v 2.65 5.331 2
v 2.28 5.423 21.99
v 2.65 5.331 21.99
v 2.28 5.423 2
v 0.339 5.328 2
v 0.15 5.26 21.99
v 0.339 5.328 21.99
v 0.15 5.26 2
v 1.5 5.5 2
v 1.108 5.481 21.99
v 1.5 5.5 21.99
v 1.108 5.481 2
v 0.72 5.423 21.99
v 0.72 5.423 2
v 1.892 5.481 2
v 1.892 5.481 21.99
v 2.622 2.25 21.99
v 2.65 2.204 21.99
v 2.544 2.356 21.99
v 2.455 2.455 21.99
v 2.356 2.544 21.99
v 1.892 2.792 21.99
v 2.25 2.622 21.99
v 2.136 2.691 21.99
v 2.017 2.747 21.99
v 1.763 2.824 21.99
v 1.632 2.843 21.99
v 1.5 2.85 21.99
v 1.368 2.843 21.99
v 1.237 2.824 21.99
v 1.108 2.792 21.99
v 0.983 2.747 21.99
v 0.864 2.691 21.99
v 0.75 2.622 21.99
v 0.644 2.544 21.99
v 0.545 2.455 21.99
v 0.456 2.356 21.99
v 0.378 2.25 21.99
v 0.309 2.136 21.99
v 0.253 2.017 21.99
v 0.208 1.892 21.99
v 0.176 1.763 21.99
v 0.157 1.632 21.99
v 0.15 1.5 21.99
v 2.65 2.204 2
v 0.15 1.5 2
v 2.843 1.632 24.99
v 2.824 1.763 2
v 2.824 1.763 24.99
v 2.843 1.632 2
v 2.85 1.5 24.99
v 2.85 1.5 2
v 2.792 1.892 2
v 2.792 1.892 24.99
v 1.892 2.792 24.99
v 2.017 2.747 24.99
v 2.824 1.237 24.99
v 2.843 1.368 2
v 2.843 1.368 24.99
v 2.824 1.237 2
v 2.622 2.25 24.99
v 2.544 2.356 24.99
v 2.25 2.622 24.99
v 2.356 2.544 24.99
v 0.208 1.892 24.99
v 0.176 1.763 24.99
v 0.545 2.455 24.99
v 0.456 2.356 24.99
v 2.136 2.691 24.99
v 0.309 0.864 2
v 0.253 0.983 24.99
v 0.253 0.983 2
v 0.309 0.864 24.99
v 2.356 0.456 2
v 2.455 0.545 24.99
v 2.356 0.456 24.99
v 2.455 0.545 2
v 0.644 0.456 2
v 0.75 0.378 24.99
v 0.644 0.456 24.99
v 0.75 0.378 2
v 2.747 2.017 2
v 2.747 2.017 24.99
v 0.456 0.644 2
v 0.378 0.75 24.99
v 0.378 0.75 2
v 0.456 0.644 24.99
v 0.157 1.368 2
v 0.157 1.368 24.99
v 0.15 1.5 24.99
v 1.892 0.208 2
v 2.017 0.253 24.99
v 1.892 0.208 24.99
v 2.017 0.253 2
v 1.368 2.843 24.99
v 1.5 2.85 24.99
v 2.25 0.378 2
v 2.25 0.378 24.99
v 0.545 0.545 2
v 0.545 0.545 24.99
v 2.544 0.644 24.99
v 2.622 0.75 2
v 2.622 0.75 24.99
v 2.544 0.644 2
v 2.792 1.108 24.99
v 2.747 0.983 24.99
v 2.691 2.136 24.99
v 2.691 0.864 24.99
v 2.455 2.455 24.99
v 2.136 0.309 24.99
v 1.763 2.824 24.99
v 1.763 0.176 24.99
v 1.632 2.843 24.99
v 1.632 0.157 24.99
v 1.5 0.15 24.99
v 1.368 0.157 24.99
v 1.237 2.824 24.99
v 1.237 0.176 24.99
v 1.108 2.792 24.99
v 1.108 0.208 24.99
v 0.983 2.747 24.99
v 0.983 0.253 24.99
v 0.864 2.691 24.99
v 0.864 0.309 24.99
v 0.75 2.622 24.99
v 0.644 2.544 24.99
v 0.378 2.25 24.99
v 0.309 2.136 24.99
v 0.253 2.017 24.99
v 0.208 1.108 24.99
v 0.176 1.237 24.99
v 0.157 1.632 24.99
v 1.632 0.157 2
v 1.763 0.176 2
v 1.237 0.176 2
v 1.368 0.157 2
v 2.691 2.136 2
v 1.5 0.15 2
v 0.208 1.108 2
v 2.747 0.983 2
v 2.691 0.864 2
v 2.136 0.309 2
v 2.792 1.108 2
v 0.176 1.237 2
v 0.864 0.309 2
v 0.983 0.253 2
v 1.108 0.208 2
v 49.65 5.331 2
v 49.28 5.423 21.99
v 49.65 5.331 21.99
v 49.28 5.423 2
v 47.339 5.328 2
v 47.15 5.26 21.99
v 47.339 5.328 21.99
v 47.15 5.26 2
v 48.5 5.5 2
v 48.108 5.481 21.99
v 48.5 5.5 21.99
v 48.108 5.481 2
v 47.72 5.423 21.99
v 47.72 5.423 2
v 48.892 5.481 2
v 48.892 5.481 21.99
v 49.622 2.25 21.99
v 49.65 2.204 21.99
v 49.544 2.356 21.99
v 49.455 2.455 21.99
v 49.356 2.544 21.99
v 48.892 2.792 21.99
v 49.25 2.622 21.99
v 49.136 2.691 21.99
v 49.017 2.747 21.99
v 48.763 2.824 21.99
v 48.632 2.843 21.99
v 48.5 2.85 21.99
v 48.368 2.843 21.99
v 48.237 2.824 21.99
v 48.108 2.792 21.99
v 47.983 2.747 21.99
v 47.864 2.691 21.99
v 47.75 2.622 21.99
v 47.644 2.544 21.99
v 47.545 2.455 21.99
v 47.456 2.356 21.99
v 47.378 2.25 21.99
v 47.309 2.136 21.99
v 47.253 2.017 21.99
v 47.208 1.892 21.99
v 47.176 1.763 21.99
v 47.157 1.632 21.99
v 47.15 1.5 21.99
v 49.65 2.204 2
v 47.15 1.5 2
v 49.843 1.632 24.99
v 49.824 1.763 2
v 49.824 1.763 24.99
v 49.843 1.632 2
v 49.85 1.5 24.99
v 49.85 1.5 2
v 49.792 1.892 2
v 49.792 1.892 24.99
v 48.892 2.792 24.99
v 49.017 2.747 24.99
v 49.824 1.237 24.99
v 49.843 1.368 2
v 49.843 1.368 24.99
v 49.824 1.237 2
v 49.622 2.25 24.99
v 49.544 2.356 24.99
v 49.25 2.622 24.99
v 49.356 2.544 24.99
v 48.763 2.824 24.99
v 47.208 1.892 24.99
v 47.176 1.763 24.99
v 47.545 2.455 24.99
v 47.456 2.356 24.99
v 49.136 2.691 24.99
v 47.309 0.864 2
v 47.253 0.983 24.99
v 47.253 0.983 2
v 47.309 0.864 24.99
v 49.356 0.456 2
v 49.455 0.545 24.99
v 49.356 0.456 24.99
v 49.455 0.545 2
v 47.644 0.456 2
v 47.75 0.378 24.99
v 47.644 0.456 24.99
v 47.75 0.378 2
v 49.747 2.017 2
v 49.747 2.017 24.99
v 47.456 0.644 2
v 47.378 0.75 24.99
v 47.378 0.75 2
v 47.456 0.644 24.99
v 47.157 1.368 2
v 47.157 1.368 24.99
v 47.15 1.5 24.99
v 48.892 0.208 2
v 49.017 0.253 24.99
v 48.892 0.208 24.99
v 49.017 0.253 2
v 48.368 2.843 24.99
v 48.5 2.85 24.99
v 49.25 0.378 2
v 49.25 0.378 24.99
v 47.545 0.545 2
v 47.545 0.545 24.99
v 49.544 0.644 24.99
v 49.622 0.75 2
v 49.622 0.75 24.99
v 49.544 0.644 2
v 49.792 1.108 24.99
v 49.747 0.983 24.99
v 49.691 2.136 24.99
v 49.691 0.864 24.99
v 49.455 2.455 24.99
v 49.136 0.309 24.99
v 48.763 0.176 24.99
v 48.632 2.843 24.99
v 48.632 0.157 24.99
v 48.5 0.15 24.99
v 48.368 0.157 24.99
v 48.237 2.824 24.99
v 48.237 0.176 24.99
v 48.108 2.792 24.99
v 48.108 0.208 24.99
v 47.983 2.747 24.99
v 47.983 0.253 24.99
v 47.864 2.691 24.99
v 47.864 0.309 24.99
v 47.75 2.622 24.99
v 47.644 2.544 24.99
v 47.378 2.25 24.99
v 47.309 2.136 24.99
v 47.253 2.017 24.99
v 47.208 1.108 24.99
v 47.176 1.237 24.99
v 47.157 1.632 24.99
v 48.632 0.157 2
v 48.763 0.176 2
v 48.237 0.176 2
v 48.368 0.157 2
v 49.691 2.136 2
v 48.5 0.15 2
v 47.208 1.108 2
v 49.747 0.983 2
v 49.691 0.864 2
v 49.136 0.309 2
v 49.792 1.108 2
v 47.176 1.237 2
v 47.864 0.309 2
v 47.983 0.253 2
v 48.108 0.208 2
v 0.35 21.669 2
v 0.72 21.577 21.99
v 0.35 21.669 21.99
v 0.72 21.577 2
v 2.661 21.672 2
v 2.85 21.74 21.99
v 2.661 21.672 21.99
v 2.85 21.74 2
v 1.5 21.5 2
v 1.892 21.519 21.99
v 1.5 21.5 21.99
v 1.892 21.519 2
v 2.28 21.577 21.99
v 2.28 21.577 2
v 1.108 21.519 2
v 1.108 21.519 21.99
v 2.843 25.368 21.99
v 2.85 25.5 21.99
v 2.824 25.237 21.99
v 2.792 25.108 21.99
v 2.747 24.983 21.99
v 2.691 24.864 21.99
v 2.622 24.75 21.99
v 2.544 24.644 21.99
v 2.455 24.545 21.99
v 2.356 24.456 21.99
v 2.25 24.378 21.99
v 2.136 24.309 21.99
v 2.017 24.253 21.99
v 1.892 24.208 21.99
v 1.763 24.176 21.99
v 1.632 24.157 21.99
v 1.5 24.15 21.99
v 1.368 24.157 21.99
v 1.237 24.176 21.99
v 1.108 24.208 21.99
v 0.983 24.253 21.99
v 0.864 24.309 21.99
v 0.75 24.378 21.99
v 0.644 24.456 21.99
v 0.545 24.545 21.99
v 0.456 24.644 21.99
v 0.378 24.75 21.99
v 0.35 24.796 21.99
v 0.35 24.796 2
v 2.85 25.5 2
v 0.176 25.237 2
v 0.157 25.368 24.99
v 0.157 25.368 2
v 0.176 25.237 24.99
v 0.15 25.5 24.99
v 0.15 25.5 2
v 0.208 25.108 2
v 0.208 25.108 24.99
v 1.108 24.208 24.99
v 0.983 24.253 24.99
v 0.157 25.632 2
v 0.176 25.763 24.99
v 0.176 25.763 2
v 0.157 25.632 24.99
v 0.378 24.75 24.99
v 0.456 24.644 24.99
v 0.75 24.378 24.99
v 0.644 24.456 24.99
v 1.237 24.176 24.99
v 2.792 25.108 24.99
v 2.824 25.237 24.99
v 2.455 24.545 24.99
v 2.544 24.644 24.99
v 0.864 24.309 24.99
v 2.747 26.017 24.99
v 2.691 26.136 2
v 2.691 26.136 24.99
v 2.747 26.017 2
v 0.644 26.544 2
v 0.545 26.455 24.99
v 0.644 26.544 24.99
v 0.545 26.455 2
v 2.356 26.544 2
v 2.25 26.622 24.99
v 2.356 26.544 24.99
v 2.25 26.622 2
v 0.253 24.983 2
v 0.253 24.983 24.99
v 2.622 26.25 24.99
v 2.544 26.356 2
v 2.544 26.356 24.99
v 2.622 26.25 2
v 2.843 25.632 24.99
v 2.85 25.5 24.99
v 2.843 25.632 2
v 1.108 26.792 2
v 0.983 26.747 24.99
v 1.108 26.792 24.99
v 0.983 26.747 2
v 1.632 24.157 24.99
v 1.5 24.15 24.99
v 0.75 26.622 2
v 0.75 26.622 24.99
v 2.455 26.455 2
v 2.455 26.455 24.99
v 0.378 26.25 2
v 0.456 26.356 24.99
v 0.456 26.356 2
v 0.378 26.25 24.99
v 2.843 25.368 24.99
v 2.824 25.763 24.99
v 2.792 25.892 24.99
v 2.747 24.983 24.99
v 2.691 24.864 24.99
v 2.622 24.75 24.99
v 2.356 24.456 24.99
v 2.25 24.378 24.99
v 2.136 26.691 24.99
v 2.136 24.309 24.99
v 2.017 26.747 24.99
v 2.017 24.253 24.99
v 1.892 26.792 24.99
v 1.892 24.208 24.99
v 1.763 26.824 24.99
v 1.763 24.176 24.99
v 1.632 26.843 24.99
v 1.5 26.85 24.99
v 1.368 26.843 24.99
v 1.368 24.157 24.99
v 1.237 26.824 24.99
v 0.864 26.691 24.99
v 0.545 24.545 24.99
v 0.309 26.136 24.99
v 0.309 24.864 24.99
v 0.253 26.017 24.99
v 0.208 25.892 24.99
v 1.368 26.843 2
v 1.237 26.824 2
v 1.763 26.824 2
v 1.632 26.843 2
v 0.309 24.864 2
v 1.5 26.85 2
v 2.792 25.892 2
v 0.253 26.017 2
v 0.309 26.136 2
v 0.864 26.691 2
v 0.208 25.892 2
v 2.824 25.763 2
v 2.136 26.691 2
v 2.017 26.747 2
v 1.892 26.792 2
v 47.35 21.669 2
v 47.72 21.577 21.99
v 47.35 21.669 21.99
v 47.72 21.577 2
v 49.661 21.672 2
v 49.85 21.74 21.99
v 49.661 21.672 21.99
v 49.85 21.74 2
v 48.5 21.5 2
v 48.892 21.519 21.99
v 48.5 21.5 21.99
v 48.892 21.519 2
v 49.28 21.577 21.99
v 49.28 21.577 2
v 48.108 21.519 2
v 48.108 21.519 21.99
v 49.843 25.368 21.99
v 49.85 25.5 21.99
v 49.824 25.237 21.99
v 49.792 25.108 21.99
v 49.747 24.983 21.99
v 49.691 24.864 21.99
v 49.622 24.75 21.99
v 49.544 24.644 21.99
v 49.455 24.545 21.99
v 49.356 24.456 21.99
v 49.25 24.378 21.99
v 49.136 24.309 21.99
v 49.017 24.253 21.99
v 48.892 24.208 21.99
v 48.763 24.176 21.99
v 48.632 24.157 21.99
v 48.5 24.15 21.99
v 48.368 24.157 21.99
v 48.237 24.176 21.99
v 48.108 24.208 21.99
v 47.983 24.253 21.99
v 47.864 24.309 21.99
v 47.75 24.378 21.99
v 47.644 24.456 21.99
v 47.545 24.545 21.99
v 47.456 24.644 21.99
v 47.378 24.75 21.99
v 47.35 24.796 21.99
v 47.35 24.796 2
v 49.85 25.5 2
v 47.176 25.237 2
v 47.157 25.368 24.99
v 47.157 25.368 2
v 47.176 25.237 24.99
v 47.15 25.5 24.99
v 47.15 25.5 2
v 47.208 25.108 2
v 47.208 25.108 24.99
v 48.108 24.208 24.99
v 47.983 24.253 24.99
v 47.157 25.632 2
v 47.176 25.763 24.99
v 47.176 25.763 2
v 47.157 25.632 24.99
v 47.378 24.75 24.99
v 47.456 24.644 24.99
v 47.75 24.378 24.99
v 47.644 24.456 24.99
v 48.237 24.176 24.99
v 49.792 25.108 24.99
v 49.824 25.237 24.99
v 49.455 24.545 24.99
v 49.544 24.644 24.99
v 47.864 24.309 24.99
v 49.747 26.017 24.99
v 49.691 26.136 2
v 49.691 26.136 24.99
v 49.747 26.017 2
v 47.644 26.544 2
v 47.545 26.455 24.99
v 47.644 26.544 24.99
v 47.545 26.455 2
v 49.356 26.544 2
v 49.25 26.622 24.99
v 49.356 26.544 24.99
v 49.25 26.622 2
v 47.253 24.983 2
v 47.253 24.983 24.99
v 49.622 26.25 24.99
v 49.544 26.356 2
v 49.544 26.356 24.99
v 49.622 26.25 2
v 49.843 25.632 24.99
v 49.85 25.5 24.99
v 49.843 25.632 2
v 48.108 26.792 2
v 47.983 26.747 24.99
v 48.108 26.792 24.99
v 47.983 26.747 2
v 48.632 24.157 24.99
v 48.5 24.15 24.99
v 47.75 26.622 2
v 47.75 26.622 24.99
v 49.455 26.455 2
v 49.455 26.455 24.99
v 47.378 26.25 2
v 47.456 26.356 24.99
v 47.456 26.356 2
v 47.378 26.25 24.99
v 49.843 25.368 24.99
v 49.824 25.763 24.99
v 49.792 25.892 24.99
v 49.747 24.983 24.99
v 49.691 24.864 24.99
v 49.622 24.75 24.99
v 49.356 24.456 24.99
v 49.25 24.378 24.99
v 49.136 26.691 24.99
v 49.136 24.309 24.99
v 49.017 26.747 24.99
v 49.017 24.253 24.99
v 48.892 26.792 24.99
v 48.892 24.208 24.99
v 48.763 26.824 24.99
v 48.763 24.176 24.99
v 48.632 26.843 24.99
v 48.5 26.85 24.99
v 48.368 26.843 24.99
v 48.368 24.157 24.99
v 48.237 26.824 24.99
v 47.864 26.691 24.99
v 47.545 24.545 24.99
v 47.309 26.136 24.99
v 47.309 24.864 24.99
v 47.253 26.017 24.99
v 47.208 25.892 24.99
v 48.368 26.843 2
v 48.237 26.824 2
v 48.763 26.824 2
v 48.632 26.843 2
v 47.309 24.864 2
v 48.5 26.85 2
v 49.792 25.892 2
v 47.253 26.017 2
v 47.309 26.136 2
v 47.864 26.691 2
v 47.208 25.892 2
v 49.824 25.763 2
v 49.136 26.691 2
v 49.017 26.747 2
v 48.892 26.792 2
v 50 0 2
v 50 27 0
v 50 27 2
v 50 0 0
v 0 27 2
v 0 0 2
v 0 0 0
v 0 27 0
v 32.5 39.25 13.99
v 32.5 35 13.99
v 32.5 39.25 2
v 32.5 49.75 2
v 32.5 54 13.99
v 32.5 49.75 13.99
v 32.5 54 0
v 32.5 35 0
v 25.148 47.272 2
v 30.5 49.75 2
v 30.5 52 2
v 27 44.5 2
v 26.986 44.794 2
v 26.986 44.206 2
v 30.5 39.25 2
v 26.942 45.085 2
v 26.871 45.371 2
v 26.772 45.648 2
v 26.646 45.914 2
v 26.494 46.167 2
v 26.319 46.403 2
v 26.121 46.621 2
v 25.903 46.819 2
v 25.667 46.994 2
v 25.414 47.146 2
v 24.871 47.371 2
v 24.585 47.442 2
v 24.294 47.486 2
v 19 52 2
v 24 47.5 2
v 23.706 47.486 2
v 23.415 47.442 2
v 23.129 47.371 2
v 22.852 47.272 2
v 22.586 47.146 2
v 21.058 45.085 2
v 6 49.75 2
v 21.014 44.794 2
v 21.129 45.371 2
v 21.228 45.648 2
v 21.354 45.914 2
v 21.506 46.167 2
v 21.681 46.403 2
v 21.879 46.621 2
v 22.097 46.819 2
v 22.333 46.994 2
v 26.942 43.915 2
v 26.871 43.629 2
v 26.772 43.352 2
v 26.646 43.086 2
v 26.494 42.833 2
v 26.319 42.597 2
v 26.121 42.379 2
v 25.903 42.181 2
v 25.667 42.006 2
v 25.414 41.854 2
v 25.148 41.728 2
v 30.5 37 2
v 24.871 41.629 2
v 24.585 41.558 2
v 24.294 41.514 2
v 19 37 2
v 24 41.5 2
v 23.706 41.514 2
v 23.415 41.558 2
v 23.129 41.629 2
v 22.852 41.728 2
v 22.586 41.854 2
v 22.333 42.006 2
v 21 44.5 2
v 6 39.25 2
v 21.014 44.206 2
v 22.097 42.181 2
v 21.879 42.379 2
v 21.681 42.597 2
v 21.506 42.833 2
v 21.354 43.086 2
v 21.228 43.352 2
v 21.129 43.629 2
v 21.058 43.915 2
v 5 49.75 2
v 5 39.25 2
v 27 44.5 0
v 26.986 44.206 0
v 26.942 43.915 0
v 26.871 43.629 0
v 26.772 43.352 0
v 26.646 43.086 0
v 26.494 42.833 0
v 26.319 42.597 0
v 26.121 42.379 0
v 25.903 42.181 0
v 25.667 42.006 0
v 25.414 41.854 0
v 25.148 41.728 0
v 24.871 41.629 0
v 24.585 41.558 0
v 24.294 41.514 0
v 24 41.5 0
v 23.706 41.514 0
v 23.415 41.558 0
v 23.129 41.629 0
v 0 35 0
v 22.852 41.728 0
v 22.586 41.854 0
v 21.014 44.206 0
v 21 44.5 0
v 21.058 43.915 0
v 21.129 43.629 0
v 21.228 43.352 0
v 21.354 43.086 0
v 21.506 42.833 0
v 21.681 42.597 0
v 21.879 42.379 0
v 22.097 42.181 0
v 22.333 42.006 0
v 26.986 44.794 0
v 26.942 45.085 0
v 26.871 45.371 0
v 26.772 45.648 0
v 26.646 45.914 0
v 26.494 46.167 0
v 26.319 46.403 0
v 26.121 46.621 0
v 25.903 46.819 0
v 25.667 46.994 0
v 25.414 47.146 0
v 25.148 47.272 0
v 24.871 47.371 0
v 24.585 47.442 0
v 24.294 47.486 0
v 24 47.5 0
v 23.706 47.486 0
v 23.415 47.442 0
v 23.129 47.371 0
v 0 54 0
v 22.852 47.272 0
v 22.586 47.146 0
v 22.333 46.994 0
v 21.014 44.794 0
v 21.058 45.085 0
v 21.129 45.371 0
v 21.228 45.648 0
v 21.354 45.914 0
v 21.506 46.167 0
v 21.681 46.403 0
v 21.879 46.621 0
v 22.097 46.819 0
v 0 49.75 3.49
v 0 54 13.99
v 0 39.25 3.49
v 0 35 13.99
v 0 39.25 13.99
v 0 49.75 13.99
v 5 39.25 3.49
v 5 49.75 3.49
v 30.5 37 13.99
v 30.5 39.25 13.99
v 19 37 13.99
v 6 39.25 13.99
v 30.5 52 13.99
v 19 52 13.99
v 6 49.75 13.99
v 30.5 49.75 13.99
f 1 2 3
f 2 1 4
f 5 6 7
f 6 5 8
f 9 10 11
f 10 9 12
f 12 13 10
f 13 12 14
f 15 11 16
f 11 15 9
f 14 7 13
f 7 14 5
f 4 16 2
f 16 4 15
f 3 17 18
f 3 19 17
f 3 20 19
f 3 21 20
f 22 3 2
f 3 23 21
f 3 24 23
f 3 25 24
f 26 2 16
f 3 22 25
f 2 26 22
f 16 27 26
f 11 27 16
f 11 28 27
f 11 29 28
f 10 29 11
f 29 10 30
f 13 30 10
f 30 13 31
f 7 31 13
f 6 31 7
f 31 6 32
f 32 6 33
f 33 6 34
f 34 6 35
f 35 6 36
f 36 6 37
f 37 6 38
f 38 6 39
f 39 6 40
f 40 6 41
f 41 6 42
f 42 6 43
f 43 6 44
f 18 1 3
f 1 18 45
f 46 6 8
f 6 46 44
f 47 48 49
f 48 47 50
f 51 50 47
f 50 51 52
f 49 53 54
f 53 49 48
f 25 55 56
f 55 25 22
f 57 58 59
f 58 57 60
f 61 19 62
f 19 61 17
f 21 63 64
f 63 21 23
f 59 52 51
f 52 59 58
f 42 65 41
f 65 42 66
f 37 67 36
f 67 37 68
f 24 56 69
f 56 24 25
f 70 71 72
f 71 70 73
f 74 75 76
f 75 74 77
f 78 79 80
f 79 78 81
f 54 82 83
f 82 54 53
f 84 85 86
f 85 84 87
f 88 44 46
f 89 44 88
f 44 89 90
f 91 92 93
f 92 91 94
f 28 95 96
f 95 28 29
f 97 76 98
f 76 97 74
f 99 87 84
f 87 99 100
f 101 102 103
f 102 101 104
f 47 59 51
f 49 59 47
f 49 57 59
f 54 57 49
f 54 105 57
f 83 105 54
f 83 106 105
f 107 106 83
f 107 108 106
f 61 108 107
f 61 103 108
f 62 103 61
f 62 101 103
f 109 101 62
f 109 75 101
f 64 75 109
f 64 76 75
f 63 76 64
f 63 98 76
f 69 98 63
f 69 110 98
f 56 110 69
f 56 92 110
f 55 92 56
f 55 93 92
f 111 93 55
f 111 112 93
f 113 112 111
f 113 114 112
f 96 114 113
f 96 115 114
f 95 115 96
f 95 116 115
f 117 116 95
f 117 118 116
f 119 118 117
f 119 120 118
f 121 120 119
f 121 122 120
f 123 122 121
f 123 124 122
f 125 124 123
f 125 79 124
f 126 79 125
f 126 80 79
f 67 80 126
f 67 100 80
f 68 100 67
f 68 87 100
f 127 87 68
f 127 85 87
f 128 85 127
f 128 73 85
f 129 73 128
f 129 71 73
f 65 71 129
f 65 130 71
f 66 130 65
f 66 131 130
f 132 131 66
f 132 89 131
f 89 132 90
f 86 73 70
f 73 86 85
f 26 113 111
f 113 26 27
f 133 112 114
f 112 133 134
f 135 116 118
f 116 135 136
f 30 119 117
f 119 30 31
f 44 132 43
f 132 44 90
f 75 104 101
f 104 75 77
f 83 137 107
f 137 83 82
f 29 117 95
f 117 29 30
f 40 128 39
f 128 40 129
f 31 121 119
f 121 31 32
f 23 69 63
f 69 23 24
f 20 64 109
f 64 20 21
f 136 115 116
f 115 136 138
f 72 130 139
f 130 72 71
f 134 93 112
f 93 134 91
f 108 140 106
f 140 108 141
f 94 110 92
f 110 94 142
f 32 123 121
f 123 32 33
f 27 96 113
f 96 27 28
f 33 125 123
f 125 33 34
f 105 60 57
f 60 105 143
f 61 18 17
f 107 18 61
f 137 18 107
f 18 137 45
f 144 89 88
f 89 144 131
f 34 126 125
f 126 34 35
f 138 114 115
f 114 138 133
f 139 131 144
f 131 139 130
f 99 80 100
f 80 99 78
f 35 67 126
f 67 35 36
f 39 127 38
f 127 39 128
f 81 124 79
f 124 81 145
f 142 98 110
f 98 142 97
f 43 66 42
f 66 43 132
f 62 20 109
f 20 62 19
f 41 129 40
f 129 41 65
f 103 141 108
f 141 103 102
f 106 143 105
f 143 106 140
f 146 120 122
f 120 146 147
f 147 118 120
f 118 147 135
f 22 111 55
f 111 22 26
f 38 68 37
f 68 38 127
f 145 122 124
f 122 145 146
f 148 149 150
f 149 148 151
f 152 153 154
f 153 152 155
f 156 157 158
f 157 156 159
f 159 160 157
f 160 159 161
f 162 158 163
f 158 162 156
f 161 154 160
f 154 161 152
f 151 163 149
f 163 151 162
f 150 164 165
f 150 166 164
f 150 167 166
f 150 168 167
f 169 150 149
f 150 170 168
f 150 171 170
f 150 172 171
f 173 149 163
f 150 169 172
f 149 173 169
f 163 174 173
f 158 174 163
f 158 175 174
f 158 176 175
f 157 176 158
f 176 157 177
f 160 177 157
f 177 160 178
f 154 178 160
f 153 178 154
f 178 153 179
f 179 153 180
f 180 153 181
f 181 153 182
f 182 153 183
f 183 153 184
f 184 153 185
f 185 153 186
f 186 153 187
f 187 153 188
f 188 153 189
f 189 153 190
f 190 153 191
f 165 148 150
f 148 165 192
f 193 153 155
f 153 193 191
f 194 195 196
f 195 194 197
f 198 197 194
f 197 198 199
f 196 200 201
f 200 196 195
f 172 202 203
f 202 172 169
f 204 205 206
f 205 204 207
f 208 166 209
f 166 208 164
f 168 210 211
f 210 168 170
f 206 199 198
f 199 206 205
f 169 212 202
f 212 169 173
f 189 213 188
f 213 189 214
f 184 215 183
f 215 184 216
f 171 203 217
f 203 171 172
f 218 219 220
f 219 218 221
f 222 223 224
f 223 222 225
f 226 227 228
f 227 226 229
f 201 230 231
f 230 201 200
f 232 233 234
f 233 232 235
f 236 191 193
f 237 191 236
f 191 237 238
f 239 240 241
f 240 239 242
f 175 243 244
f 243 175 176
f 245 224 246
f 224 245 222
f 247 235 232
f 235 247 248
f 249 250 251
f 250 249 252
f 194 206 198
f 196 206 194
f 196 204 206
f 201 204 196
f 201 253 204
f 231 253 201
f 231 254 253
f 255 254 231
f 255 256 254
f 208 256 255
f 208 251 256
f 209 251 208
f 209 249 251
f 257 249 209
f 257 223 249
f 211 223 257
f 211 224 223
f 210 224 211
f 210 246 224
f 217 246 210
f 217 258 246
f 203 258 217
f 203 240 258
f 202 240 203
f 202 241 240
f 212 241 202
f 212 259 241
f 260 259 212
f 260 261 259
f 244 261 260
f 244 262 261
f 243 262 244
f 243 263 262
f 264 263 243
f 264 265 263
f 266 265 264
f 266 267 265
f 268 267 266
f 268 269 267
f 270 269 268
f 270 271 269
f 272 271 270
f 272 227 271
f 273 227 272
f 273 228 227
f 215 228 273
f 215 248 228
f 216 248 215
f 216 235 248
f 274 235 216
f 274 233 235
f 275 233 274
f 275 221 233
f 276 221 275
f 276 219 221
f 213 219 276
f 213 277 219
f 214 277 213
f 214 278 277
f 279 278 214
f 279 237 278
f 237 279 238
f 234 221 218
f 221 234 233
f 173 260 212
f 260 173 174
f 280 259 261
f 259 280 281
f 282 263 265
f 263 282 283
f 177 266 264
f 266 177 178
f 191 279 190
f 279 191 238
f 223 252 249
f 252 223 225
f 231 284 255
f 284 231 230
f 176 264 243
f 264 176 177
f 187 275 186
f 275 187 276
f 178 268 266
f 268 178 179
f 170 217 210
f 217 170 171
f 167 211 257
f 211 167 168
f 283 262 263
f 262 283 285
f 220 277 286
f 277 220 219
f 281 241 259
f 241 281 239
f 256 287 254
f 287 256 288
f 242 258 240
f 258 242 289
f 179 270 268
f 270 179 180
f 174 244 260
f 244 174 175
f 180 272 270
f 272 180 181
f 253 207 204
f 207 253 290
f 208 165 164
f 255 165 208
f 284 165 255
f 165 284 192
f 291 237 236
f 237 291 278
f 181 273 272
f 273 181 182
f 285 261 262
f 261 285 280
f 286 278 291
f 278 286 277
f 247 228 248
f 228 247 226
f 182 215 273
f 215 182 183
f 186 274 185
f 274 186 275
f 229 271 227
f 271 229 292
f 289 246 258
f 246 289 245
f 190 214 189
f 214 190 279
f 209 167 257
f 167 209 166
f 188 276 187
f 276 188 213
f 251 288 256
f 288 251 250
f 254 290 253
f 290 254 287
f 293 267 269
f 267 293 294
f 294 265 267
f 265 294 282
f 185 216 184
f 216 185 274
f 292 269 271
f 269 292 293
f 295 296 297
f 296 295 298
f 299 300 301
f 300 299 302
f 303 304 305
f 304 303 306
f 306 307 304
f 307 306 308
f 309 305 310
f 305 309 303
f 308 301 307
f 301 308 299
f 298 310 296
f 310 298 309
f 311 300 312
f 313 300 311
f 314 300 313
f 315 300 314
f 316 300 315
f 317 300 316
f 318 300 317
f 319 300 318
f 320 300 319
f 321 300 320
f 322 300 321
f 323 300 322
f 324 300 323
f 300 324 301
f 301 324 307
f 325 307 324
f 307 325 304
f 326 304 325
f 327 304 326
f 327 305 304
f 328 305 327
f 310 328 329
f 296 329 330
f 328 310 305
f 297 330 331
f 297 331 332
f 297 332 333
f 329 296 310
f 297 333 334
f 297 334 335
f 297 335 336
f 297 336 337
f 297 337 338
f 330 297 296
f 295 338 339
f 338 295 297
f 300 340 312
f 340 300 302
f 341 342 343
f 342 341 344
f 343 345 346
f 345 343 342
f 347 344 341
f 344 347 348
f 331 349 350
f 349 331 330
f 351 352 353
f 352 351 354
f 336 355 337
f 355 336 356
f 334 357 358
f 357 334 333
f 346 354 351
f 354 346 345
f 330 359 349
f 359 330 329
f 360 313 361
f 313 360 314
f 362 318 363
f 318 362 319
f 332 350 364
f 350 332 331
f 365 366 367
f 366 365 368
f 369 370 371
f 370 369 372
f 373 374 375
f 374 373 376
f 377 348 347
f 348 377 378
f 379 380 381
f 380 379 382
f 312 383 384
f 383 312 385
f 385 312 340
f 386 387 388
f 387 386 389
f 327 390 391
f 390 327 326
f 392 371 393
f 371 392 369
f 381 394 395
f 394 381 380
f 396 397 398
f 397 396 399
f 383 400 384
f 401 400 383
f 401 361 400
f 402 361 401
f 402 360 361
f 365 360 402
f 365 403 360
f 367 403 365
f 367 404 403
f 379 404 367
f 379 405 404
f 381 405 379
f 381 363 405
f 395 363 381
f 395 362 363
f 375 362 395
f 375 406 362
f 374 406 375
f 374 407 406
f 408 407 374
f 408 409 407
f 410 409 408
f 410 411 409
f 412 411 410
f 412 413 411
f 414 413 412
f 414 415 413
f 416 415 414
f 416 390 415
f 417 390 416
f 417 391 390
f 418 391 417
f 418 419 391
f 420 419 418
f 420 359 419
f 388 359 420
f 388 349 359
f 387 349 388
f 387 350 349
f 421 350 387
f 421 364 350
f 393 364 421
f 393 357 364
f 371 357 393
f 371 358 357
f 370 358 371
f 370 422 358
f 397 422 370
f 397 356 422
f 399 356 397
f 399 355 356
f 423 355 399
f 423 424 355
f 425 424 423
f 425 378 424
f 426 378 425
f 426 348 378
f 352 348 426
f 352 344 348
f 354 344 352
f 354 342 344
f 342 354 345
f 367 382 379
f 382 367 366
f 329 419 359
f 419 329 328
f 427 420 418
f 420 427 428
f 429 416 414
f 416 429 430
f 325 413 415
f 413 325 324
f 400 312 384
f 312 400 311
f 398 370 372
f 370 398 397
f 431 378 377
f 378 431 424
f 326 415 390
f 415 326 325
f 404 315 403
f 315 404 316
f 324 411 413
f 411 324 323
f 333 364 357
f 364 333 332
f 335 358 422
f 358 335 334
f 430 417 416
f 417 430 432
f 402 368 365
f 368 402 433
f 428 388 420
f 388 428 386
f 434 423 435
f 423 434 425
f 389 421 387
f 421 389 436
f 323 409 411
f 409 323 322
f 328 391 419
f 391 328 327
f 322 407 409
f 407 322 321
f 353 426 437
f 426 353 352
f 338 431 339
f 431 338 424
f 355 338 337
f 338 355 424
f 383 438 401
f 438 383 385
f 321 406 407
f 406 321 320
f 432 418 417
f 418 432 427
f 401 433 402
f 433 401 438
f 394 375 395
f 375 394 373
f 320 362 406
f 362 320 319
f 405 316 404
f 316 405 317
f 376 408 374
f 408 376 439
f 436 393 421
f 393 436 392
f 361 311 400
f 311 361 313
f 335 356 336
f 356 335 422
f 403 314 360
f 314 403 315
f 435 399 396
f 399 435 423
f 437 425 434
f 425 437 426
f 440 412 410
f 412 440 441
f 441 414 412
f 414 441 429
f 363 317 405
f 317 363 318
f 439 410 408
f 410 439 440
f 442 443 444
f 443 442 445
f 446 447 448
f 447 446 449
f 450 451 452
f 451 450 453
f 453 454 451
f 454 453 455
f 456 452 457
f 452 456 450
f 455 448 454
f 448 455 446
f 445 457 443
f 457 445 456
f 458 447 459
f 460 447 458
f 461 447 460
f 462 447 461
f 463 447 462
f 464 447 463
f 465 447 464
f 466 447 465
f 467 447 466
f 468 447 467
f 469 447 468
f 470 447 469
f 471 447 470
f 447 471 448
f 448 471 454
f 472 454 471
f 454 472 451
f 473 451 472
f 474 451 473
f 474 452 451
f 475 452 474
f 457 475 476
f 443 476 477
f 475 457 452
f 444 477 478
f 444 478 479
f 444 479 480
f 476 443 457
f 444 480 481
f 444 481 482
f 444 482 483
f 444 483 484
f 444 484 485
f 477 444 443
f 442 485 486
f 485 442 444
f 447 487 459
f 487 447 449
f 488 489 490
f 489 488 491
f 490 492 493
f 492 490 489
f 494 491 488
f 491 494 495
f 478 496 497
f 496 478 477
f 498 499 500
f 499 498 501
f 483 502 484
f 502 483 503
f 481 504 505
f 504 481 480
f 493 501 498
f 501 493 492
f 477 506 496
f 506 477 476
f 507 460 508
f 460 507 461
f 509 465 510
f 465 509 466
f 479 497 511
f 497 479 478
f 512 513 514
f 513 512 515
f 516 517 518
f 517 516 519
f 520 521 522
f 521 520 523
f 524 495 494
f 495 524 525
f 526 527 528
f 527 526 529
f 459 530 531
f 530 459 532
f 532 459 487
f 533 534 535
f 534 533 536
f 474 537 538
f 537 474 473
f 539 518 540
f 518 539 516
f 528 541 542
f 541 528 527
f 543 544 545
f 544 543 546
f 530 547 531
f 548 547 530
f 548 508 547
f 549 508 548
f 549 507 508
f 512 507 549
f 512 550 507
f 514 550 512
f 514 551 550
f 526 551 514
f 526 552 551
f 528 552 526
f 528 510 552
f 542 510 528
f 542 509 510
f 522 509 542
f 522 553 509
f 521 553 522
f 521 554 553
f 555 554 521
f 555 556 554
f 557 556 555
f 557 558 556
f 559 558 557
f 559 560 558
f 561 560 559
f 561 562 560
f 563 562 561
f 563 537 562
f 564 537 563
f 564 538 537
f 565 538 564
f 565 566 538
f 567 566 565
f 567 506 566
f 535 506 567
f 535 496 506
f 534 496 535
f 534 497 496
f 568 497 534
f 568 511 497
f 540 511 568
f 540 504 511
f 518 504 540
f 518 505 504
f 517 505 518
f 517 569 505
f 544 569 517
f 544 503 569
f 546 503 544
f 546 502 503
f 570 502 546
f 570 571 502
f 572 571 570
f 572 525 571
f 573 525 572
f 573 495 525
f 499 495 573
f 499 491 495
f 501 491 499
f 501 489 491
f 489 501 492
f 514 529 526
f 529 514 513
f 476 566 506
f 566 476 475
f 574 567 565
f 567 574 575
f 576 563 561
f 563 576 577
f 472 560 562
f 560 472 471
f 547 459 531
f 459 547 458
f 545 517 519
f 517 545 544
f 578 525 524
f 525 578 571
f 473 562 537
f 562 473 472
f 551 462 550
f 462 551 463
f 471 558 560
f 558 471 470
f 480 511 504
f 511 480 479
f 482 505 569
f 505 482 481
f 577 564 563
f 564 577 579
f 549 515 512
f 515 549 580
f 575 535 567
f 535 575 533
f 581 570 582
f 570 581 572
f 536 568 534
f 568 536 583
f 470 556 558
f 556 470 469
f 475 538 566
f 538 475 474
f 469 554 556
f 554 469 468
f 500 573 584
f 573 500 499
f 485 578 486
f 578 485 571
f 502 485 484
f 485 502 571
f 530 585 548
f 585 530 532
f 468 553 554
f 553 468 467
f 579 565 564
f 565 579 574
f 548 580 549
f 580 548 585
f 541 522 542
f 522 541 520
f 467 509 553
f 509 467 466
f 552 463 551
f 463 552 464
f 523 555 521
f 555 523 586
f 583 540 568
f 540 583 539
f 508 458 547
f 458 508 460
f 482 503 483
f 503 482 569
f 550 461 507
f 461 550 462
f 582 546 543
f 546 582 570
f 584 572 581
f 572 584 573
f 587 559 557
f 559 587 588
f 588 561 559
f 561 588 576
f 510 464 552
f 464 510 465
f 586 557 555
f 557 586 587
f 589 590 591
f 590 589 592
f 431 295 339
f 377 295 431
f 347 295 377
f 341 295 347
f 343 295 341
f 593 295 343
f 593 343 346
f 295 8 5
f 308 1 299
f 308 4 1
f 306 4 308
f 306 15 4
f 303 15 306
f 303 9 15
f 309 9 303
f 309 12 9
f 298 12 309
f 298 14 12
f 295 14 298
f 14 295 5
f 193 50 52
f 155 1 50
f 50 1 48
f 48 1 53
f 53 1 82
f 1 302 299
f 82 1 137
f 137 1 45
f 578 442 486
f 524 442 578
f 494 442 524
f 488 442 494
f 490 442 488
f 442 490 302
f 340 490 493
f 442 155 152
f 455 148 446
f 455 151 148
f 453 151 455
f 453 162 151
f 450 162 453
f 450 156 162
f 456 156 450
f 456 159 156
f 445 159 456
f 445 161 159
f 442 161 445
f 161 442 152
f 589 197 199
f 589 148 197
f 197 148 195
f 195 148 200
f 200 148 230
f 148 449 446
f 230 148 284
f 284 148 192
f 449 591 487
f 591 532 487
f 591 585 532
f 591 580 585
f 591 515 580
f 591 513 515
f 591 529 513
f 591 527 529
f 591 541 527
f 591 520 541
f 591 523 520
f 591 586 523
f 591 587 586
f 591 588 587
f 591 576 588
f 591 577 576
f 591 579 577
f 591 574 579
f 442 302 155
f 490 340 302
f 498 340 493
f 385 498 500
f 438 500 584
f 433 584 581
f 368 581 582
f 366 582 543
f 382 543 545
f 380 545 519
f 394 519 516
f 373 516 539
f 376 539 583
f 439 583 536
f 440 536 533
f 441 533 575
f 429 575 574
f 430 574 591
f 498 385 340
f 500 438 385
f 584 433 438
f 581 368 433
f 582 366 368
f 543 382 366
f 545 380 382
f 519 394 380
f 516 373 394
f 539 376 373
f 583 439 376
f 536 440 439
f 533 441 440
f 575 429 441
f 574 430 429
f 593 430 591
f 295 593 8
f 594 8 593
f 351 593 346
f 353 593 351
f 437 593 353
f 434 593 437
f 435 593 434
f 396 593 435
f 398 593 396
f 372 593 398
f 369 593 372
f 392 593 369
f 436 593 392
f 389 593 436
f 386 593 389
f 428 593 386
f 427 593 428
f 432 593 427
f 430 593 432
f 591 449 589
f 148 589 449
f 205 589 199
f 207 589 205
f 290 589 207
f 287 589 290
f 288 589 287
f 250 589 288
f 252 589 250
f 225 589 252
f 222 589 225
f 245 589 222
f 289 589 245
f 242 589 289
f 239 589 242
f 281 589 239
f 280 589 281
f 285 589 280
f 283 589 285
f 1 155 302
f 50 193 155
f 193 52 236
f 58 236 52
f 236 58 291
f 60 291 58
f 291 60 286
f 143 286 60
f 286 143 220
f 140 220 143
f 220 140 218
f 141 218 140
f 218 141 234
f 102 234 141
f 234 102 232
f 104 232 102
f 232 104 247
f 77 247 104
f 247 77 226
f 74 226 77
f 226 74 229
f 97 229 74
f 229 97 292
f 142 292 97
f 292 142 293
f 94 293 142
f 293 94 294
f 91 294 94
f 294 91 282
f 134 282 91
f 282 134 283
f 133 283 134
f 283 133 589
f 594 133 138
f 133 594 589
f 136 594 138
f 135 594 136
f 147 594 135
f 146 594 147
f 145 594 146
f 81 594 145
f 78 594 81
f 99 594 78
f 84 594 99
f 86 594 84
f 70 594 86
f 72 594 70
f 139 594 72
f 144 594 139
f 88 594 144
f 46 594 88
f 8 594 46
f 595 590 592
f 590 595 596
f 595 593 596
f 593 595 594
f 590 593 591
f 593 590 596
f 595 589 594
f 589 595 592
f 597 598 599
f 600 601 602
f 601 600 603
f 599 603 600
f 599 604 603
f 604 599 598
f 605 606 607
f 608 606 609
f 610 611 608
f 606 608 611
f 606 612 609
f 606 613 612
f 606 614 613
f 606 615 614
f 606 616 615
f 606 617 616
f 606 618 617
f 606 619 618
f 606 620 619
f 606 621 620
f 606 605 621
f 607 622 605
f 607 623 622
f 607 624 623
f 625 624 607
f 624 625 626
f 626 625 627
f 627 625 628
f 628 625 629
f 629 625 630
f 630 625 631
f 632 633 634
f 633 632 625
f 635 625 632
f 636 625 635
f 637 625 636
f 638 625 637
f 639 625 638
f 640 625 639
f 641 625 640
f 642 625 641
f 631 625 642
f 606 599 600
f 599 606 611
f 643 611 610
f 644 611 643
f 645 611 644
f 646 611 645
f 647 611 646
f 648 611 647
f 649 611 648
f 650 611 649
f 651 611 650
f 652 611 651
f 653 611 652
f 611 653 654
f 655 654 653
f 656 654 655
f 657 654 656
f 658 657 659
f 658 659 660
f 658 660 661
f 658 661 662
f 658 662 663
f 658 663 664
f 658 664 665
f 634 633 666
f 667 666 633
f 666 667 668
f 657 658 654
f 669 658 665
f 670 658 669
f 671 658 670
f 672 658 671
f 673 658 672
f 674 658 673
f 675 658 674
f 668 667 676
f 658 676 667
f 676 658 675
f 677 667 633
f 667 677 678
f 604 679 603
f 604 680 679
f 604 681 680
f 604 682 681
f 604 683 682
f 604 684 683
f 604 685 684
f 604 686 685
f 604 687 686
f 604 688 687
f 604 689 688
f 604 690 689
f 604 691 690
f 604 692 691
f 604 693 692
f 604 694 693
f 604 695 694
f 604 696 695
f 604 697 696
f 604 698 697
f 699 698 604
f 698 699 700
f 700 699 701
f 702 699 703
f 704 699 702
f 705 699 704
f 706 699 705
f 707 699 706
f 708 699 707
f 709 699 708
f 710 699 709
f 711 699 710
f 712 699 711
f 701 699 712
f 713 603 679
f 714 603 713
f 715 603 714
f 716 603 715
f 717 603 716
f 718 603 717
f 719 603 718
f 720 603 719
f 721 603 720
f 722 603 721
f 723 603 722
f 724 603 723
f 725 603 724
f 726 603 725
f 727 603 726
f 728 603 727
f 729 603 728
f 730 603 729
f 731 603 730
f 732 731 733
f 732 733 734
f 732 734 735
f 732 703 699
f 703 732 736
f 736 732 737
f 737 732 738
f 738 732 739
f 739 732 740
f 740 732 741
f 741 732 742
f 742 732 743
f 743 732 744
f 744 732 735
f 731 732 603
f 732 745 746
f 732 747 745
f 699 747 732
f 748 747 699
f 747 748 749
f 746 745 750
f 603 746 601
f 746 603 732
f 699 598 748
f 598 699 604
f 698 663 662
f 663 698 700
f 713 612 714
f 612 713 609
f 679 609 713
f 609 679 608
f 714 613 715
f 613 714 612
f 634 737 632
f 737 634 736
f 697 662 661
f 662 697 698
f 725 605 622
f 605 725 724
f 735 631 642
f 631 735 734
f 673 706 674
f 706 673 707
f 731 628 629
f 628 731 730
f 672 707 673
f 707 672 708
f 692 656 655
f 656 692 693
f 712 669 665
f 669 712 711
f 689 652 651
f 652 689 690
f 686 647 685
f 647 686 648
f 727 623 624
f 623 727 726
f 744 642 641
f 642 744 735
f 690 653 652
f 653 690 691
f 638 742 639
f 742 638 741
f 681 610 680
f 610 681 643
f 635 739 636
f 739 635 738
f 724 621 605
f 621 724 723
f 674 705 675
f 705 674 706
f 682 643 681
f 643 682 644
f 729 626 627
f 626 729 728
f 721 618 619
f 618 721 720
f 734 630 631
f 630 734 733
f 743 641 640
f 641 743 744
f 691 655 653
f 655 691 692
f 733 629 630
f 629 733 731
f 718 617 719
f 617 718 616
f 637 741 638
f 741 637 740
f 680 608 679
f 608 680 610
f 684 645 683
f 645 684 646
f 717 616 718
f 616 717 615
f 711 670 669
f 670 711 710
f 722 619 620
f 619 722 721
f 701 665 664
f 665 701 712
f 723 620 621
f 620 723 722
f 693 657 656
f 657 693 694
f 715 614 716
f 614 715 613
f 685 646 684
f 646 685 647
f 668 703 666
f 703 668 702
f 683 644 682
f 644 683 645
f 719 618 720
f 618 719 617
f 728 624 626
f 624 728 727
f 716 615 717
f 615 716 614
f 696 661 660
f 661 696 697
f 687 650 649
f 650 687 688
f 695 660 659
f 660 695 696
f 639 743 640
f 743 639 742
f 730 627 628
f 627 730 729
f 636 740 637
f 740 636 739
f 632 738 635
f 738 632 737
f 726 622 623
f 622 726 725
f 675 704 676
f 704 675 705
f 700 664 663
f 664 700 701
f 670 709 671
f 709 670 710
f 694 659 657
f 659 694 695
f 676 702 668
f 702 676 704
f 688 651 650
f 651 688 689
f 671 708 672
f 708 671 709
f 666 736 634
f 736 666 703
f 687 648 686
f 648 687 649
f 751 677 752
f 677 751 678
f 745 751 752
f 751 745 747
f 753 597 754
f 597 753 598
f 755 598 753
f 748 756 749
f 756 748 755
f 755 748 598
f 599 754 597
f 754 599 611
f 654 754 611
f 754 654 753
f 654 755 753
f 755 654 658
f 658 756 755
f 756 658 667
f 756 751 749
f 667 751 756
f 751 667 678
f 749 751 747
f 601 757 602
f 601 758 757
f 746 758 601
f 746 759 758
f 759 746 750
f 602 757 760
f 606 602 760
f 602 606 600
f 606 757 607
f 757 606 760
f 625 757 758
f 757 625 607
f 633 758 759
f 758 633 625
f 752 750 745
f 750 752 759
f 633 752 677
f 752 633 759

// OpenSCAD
$fn=64;
eps = 0.01;
w   = 2;


module esp32post() {
    cylinder( r=1.35, h=23 );
    
    intersection() {
        cylinder( r=4, h=20 );
        
        translate( [ -1.35, 0, -eps ] ) {
            cube( [ 2.5, 4, 21 ] );
        }
    }
};

module esp32posts() {
    esp32post();

    translate( [ 47, 0, 0 ] )
    esp32post();

    translate( [ 0, 24, 0 ] )
    rotate( [ 0, 0, 180 ] )
    esp32post();

    translate( [ 47, 24, 0 ] )
    rotate( [ 0, 0, 180 ] )
    esp32post();
};

module plugholderWall() {
    linear_extrude( 12 ) {
        polygon( [
             [  0,       -10.5/2 ],
             [  6,       -10.5/2 ],
             [ 19,       -15/2 ],
             [ 30.5,     -15/2 ],
             [ 30.5,     -10.5/2 ],
             [ 30.5 + w, -10.5/2 ],
             [ 30.5 + w, -15/2 - w ],
             [ 0,        -15/2 - w ],
        
         
        ] );
    }
};

module plugholder() {
    translate( [ 0, - ( 10.5 + 2*w ) / 2, 0 ] )
    cube( [ 5, 10.5 + 2*w, 1.5 ] );

    plugholderWall();
    
    
    translate( [ 0, 0, 12 ] )
    rotate( [180, 0, 0] )
    plugholderWall();    
}

// -- temp

module esp32 () {
    cube( [ 50, 27, w ] );

    translate( [ 1.5, 1.5, w-eps ] )
    esp32posts();
};

module ph() {
    difference() {
        cube( [ 30.5+w, 19, w ] );
        translate( [ 24, 19/2, -eps ] )
        cylinder( r=3, h=w+2*eps );
    };

    translate( [ 0, 19/2, w-eps ] )
    plugholder();
};

esp32();

translate( [ 0, 35, 0 ] )
ph();
